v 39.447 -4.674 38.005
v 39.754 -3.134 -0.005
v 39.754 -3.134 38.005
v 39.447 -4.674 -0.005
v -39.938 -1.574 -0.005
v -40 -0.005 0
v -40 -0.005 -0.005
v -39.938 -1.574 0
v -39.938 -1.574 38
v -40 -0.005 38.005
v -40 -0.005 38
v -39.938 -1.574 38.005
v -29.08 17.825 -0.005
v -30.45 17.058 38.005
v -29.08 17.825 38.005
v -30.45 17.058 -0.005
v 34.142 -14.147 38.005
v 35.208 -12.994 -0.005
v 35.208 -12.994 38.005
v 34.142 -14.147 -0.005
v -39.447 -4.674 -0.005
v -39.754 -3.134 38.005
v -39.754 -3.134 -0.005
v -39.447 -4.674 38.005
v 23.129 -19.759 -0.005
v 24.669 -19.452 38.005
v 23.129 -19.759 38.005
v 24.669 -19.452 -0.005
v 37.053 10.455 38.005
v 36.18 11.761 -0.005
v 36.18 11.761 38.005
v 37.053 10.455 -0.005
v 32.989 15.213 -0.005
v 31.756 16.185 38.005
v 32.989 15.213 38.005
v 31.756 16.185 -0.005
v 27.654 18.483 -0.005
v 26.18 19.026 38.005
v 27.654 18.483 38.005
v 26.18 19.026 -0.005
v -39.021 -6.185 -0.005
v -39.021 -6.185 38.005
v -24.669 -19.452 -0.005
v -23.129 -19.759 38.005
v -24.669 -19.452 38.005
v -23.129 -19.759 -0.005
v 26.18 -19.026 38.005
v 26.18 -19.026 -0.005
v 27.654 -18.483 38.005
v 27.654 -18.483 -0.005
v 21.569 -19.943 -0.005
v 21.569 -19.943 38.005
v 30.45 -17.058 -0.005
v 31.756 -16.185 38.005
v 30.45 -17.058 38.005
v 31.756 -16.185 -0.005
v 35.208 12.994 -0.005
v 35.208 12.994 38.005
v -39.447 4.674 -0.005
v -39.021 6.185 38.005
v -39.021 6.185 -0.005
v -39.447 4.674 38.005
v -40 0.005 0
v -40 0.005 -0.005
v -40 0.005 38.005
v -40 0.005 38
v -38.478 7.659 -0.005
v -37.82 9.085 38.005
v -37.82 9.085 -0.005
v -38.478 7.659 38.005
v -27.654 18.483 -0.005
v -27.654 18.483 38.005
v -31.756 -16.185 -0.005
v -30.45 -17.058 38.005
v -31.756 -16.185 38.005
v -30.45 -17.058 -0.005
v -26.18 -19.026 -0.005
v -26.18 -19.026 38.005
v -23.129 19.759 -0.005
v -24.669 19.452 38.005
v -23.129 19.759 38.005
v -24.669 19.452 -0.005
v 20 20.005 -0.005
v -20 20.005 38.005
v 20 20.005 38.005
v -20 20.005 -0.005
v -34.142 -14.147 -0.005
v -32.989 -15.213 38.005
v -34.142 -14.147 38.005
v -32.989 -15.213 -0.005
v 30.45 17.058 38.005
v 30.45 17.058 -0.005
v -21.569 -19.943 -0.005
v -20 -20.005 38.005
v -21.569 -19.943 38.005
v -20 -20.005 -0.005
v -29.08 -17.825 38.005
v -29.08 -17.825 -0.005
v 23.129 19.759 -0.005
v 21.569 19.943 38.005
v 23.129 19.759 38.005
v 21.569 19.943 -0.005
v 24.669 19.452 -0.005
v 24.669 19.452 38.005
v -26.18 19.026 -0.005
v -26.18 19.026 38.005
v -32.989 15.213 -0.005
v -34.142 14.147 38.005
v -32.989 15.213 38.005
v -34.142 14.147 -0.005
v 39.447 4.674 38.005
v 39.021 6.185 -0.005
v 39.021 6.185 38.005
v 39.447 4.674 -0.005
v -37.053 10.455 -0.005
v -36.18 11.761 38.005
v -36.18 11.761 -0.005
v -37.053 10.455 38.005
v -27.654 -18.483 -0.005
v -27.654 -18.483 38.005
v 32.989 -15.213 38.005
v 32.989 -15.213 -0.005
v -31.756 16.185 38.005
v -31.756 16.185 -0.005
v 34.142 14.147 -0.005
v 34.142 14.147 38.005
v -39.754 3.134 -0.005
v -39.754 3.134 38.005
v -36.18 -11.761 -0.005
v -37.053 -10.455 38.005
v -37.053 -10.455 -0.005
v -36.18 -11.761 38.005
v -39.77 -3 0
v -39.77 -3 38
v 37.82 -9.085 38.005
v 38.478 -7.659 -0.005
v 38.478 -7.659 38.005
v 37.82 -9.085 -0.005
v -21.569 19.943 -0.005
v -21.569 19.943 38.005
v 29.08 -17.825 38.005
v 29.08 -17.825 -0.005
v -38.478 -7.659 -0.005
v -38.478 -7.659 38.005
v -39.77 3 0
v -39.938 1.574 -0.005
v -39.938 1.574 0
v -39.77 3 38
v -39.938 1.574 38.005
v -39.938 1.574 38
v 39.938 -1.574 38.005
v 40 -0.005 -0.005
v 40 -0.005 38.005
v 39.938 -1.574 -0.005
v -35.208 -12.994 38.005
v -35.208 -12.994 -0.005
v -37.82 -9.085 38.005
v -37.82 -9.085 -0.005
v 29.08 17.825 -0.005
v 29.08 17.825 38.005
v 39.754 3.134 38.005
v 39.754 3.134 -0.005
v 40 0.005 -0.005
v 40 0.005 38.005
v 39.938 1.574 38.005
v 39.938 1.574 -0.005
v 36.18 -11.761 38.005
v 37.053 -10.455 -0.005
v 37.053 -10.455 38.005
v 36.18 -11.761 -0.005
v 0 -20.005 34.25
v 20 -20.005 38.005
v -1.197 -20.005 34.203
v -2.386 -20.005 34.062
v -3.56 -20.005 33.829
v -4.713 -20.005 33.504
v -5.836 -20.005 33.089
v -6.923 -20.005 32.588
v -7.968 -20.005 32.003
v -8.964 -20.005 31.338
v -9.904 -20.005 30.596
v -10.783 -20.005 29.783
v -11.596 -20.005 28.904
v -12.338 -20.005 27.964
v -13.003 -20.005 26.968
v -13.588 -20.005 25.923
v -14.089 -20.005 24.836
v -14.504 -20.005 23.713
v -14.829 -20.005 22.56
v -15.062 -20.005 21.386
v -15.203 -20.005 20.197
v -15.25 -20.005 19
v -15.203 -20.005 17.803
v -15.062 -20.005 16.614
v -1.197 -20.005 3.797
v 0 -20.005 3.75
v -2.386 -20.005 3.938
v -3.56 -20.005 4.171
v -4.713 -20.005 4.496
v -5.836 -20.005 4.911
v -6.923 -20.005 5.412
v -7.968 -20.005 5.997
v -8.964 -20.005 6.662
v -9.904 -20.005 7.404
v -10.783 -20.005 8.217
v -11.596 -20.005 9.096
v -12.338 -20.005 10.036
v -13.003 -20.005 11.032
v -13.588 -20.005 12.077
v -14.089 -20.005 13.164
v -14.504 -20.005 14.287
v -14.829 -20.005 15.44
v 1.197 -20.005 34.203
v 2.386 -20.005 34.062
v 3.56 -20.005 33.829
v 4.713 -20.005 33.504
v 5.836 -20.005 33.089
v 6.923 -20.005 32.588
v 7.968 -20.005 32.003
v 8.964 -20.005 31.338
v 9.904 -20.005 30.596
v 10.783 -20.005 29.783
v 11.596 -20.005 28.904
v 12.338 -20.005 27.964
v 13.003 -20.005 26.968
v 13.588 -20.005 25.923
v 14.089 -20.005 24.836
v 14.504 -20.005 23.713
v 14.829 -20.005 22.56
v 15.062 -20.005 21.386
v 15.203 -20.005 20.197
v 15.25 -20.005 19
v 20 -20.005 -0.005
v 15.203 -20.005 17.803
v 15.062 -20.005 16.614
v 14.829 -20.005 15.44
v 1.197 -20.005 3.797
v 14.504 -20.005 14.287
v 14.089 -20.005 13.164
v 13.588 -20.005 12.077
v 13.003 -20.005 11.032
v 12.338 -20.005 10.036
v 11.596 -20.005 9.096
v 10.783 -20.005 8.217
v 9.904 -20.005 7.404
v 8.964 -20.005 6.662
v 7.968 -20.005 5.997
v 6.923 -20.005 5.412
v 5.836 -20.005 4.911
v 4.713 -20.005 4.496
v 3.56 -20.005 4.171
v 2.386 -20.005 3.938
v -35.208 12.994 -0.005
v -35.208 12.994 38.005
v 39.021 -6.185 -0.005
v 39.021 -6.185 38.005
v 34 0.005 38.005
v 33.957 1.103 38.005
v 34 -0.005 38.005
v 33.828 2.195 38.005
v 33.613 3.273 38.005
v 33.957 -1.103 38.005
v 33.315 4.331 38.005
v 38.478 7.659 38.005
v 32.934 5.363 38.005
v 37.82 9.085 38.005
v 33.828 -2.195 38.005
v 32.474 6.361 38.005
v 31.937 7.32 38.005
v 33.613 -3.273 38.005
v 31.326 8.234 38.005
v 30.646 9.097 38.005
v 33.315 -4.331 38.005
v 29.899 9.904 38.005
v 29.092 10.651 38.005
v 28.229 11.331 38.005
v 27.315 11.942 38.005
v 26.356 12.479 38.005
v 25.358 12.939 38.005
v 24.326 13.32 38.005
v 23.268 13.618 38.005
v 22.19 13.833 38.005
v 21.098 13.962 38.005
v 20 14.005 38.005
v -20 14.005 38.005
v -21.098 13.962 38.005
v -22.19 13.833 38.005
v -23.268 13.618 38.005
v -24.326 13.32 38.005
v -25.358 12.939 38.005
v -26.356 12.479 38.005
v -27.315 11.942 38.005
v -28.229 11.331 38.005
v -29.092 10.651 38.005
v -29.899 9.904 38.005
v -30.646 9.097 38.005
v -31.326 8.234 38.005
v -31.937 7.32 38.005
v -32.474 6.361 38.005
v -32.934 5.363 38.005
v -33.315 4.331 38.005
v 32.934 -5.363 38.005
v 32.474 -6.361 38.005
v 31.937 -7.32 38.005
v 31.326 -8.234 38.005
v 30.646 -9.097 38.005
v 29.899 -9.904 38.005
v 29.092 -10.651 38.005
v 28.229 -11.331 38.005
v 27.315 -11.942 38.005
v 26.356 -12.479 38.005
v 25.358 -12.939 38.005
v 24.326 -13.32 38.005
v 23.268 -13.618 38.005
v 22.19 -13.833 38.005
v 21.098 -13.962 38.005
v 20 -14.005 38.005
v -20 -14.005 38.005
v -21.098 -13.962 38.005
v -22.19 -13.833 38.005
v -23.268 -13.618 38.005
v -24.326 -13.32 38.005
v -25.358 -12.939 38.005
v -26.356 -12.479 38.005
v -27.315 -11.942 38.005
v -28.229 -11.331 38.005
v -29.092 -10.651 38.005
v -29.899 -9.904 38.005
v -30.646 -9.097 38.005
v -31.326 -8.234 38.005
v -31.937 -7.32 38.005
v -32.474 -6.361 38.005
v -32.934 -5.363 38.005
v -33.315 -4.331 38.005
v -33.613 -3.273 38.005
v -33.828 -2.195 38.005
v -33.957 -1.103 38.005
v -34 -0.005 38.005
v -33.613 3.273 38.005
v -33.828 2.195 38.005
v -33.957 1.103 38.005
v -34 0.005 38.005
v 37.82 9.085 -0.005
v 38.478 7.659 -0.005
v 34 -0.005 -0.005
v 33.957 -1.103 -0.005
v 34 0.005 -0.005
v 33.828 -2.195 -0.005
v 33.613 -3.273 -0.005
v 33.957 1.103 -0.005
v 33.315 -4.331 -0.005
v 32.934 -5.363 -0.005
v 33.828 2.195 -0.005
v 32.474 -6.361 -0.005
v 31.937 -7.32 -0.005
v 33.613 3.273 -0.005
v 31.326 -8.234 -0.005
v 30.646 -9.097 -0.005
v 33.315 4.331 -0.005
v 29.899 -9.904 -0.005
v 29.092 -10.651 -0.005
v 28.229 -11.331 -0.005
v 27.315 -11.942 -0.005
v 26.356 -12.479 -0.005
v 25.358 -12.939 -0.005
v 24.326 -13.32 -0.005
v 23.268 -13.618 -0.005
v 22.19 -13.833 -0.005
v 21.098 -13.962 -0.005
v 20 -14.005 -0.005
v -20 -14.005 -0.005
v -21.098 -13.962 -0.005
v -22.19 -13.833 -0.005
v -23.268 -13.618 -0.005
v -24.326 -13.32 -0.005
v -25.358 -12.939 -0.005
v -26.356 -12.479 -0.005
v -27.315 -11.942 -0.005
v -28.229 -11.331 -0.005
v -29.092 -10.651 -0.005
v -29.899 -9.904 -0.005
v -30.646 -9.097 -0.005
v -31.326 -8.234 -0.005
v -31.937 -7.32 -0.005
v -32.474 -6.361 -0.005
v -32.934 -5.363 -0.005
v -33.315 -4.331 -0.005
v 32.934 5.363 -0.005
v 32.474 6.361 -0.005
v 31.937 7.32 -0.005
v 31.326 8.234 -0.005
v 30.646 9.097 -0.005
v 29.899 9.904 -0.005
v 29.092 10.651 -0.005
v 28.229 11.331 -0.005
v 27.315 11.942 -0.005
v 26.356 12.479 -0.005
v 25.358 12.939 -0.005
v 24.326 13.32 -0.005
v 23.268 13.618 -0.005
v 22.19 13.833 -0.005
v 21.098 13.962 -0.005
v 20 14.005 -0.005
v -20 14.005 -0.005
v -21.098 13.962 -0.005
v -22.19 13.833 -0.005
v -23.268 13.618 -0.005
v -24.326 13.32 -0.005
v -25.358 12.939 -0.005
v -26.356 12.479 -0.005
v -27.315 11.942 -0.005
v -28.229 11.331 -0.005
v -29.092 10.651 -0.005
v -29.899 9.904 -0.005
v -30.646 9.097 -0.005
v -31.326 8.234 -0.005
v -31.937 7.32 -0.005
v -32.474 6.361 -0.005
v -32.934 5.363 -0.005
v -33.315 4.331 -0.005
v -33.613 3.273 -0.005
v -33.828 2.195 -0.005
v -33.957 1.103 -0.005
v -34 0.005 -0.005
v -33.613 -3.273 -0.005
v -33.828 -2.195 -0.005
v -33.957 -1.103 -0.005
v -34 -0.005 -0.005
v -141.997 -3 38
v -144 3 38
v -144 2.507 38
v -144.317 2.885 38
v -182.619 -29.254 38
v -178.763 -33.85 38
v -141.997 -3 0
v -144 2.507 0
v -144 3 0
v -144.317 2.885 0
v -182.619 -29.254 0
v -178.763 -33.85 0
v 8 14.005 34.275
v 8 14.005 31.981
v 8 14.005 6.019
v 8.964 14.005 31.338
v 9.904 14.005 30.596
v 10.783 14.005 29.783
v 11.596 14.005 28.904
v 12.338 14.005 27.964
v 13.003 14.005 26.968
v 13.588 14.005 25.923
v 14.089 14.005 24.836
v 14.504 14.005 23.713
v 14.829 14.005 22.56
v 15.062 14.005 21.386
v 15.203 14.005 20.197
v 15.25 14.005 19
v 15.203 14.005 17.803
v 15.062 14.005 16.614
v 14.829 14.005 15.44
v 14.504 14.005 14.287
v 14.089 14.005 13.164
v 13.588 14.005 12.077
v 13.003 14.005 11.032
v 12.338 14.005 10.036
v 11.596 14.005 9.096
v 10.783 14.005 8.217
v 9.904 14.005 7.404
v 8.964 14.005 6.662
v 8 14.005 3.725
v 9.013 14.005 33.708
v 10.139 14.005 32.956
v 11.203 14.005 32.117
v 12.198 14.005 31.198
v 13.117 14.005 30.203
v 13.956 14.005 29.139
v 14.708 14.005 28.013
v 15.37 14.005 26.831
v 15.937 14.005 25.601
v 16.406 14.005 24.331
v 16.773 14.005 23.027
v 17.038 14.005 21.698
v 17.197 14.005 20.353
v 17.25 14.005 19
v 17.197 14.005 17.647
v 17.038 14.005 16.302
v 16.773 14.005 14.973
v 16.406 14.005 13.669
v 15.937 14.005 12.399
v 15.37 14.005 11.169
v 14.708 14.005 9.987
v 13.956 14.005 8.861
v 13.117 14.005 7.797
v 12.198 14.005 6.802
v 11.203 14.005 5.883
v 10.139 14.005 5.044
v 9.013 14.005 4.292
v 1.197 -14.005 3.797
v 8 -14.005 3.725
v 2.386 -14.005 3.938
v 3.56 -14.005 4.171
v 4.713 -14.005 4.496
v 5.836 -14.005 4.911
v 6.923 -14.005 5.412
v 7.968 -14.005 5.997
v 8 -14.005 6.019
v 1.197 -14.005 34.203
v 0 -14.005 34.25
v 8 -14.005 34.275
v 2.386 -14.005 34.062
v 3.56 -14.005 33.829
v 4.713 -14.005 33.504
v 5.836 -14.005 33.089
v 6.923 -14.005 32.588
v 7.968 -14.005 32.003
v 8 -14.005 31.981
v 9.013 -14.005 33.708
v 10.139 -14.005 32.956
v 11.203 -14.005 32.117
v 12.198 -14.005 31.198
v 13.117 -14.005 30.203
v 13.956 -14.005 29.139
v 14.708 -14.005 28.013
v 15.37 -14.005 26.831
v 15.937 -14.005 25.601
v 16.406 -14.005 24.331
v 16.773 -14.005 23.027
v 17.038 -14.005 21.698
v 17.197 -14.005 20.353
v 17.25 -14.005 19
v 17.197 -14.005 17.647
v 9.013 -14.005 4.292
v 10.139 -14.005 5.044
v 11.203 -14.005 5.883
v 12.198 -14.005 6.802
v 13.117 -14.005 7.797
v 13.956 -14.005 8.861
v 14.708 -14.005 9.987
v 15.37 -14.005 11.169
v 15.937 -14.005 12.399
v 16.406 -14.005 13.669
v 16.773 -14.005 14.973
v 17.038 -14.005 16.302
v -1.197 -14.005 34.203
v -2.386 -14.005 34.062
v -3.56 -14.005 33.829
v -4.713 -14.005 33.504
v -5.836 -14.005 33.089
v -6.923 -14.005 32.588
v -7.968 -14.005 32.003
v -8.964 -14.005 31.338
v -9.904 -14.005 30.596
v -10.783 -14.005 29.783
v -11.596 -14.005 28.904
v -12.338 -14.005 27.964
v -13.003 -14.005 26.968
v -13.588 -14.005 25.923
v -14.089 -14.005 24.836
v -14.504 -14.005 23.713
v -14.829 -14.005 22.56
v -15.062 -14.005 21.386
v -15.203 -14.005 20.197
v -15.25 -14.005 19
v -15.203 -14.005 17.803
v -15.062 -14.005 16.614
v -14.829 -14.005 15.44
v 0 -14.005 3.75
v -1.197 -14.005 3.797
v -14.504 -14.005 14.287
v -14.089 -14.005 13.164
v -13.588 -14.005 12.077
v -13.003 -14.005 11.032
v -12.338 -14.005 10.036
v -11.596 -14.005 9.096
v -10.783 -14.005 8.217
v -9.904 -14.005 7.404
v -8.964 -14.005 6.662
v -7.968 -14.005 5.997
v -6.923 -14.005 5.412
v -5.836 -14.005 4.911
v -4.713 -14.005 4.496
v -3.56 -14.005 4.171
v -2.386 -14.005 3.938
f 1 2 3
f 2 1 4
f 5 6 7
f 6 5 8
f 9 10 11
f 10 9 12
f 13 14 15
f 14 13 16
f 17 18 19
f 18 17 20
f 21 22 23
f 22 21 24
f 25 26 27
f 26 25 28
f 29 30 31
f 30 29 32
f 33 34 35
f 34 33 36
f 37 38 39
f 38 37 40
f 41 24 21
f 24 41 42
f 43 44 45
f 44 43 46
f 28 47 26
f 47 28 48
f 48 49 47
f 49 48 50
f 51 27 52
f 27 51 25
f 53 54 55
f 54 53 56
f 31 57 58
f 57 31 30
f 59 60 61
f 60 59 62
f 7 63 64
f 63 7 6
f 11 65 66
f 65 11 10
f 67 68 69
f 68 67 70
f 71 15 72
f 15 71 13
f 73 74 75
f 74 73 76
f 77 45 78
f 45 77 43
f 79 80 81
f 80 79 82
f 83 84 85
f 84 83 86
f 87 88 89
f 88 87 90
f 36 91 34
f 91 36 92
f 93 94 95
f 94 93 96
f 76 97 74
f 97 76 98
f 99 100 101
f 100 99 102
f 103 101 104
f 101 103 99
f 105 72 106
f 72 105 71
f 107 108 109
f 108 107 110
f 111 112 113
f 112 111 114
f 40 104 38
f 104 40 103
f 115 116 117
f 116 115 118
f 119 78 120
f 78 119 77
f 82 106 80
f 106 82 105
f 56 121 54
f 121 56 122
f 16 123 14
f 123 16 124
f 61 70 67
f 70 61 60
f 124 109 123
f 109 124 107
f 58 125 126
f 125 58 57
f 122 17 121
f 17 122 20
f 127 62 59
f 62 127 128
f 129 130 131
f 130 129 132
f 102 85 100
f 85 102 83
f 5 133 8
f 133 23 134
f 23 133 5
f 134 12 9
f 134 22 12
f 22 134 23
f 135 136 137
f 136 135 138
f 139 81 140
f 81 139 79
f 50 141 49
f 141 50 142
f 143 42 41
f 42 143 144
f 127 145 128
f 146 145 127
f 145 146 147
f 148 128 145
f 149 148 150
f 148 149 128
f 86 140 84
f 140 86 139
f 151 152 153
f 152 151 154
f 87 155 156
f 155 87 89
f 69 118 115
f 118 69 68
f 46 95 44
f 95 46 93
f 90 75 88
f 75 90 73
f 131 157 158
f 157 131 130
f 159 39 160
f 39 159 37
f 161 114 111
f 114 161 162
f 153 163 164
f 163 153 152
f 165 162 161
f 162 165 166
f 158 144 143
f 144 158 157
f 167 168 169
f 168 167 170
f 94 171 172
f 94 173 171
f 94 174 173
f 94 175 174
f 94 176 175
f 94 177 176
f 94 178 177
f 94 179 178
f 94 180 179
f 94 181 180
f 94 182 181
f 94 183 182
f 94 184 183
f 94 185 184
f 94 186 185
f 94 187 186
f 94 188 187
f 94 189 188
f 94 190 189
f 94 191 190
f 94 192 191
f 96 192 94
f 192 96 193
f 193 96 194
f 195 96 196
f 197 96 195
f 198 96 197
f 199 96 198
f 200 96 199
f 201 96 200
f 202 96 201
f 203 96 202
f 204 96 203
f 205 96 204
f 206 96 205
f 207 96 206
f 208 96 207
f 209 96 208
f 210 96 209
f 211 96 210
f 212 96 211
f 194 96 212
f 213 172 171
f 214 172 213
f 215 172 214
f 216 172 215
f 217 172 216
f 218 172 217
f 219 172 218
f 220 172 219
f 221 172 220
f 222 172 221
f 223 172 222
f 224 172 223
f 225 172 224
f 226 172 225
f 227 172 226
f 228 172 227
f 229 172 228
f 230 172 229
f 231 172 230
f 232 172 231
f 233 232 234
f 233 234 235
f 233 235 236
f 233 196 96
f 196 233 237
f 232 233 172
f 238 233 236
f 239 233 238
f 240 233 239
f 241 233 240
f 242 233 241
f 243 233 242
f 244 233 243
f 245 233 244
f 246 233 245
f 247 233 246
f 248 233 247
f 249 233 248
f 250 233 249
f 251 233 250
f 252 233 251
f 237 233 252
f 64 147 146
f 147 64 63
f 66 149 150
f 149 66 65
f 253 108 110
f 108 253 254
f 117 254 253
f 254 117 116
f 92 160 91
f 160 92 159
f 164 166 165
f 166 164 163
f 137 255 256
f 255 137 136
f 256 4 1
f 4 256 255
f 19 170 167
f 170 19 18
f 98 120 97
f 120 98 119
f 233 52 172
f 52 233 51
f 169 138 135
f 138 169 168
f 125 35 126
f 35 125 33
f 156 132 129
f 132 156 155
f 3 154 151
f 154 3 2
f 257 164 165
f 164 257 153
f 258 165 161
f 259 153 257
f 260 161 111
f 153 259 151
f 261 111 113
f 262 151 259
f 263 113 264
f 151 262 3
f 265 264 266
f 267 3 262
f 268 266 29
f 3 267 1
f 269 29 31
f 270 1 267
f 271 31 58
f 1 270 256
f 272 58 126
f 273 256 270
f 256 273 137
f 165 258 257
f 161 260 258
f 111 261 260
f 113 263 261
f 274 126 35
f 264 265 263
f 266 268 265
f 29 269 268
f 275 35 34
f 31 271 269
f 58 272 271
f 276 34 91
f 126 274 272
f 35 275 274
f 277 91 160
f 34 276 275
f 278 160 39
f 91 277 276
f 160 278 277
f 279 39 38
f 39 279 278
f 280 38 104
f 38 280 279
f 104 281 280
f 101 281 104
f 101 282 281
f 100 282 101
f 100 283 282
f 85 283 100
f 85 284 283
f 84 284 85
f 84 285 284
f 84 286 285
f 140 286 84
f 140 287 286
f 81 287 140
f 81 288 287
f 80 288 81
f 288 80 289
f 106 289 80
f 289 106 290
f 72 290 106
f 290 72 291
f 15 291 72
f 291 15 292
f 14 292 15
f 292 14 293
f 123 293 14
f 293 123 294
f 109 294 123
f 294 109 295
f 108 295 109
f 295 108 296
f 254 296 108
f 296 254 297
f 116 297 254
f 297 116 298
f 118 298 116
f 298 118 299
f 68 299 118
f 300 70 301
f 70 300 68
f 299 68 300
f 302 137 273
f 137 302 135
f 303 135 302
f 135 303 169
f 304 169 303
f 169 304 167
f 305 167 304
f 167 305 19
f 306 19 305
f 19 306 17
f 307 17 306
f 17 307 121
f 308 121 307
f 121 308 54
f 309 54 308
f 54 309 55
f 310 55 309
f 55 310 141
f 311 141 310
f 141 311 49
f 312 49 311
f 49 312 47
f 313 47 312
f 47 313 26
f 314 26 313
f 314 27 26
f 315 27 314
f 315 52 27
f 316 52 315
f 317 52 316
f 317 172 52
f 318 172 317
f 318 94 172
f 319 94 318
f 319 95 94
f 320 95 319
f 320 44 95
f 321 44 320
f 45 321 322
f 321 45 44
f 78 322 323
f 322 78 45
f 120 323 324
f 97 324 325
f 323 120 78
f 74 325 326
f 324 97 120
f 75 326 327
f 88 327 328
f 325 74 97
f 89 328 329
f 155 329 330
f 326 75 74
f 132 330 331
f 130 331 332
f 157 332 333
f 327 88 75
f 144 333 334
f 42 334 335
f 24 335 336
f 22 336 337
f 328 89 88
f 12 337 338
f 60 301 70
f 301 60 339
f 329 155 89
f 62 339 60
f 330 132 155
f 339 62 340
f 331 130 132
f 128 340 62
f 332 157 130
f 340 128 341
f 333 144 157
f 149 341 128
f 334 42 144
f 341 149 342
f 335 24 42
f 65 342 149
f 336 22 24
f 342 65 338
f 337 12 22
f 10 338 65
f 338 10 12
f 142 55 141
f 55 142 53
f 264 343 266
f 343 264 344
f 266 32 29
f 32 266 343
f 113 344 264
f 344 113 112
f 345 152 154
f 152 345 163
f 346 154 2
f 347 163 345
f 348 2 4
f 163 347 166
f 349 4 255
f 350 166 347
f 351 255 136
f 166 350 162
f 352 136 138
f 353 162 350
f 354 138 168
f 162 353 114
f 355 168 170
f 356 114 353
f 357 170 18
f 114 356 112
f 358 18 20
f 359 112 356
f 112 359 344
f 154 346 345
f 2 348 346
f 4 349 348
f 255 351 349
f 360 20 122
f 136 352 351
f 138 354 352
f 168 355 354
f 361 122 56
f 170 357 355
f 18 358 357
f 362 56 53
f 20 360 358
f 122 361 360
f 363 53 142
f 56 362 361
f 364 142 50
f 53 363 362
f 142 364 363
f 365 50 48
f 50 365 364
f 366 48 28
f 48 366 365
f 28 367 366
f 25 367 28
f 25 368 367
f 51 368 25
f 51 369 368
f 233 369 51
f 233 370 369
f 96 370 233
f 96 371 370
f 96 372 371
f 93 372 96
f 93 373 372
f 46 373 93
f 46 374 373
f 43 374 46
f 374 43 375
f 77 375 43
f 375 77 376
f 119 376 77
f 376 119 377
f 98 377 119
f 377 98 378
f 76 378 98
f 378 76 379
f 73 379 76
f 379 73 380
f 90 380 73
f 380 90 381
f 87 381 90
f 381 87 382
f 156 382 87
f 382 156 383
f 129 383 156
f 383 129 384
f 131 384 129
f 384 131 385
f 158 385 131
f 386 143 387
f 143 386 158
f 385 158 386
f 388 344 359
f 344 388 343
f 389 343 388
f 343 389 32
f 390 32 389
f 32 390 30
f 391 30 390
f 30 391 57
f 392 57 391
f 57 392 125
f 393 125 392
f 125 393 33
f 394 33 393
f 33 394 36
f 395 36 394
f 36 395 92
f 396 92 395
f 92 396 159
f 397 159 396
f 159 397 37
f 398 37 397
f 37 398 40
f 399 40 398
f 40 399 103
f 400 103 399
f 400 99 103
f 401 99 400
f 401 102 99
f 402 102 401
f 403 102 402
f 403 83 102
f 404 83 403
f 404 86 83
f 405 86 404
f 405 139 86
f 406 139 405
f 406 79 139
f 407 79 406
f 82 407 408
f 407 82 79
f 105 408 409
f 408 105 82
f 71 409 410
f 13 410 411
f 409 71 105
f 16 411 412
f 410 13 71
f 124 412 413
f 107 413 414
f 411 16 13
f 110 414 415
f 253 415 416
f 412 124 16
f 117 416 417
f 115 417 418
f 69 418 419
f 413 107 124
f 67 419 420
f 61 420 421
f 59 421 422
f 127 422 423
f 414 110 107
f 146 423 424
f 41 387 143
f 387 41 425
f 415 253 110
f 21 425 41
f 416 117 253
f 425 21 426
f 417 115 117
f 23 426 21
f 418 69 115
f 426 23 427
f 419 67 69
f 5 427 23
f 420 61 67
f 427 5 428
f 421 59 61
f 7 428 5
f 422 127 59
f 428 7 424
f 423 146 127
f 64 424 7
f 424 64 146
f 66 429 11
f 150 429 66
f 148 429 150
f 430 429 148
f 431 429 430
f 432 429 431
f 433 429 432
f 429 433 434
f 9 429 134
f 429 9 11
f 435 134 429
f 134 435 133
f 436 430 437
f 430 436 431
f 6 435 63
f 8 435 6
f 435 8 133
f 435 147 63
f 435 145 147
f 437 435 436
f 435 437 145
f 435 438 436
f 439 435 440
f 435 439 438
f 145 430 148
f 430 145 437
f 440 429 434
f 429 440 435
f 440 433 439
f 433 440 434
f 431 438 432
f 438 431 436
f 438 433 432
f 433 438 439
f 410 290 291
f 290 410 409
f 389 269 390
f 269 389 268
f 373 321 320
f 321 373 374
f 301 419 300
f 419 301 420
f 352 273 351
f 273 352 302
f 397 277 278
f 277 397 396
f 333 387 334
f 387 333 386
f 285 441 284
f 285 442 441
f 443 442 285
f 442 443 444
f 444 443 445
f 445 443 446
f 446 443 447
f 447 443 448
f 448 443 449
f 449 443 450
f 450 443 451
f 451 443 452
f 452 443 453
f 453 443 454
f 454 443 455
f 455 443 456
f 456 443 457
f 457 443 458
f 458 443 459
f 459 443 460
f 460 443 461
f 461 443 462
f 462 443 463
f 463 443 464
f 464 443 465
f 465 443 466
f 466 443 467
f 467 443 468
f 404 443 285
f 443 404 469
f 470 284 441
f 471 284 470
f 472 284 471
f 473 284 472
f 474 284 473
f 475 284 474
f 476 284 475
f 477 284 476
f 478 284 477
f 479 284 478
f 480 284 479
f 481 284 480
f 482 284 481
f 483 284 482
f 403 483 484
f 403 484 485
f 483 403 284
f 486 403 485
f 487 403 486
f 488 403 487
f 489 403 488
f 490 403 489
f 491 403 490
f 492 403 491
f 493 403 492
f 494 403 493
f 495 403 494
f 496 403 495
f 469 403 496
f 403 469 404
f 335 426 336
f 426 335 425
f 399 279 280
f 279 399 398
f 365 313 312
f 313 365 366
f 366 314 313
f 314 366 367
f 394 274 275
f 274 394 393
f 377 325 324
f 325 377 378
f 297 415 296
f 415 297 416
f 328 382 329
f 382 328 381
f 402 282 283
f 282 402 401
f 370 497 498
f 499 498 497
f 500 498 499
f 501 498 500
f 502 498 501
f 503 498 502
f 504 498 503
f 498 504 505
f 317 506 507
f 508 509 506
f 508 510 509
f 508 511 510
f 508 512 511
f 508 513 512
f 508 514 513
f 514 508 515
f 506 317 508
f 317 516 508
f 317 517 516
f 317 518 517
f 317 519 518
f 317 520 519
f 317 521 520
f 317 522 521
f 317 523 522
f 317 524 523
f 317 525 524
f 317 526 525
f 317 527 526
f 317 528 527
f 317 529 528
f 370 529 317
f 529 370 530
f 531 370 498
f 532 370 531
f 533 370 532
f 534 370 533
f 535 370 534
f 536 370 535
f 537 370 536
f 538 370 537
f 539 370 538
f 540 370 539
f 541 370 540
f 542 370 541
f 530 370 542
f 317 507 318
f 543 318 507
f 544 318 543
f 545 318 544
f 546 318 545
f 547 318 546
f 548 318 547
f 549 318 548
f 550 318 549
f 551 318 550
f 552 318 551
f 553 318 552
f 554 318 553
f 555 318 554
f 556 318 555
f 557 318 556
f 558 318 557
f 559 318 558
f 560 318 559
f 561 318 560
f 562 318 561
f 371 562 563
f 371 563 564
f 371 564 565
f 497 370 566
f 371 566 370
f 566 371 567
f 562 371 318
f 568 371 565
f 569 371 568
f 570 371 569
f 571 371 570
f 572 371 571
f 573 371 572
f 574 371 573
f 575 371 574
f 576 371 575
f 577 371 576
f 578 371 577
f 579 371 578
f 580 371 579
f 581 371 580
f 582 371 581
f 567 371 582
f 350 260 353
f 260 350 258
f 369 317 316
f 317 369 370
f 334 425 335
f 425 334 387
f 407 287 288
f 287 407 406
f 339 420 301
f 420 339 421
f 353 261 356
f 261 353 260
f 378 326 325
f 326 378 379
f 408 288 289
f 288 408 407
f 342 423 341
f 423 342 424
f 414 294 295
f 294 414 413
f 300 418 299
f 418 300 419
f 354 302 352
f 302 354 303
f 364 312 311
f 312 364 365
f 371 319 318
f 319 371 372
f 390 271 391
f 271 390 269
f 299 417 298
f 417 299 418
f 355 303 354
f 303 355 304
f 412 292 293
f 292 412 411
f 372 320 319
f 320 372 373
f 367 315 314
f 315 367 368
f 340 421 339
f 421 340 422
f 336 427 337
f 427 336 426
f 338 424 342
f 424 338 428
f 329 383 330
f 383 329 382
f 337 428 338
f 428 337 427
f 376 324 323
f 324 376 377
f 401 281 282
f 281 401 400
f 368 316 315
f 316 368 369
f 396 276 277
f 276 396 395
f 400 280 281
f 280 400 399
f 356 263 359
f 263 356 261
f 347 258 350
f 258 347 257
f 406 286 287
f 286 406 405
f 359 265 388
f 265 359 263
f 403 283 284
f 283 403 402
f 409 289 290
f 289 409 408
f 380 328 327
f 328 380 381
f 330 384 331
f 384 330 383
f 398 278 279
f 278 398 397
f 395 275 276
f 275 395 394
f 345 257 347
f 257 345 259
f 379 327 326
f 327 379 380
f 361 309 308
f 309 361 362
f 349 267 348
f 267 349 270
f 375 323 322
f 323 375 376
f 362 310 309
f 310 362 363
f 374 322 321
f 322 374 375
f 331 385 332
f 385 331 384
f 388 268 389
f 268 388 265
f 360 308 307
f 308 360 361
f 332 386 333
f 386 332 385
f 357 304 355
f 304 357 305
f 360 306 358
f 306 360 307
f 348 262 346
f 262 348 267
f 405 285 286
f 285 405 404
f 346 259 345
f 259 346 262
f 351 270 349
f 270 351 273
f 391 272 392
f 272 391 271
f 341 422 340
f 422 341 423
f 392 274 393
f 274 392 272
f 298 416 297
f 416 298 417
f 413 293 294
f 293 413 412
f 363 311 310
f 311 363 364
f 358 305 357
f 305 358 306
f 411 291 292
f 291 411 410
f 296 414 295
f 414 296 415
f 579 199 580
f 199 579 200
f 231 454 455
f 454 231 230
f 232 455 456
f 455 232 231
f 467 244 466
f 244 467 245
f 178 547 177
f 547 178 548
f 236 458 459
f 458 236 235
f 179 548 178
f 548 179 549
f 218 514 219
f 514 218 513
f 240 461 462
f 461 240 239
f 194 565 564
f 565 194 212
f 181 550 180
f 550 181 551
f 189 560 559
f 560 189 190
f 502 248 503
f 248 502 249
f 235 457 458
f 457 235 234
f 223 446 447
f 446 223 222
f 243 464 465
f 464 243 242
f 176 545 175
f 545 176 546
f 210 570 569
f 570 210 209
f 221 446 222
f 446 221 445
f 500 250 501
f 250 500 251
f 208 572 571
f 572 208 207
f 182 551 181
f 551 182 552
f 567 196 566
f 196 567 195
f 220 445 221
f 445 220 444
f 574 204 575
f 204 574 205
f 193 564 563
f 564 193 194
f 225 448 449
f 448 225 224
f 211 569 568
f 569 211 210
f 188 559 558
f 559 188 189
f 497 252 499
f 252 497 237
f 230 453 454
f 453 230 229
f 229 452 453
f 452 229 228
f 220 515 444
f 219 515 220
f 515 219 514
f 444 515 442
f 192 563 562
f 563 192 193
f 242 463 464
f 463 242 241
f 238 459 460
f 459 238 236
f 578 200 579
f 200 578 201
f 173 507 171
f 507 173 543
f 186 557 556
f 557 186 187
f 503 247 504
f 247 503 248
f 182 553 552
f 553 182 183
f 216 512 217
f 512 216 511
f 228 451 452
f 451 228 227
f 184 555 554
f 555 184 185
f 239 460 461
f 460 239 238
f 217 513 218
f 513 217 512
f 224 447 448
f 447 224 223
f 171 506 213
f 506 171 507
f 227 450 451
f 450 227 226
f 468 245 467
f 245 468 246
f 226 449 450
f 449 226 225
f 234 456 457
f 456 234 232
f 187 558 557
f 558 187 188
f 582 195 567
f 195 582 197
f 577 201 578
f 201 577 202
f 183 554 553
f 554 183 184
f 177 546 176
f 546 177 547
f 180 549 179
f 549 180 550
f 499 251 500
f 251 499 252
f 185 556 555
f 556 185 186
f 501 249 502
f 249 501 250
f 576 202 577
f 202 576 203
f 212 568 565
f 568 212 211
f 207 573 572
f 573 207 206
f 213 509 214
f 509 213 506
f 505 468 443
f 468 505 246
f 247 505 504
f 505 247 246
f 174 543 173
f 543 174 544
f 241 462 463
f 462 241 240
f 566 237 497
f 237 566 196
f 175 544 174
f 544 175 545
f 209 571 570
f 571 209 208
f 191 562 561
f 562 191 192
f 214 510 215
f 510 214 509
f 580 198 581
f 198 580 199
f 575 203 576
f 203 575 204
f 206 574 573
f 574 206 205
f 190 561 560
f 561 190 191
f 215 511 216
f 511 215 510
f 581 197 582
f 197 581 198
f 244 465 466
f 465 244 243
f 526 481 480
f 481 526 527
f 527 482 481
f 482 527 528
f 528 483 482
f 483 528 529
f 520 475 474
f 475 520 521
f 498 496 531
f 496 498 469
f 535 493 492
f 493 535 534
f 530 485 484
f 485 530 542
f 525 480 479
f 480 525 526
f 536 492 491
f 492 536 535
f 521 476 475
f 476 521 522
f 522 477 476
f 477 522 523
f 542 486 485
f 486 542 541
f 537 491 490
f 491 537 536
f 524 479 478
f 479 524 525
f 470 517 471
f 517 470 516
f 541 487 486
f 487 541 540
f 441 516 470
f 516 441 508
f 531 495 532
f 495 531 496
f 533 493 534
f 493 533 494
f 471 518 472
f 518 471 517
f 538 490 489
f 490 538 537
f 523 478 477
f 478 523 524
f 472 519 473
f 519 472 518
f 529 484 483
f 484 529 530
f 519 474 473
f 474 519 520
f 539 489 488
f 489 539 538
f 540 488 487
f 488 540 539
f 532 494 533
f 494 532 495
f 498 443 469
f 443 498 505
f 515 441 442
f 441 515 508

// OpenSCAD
bottleneck = 30.5;
largerad=20;
length = 80;
$fn=80;
height1=38;
supportheight=105;
supporthick=6;
topthick=supporthick;
footwide=50;
bottletorquebardiam=3;
bottledelta=5;
supportangle=5;
step=35;
holes=false;


module outside(){
    minkowski(){
    cube([length-2*largerad,0.01,0.01],center=true);
    cylinder(h=height1,r=largerad,center=false);
    }
    translate([-length/2+1,-supporthick/2,0])
    rotate([0,0,90])
    cube([supporthick,supportheight,height1],center=false);
//    translate([-length/2+1,0,4])
//    rotate([0,0,90])
//    cube([supporthick,supportheight-3,height1-8],center=false);
    translate([-length/2-supportheight-0.7*(footwide/2)+0.96,-0.6193*(footwide/2),height1/2])
    rotate([0,0,130])
    cube([supporthick,footwide,height1],center=true);
}
    


module inside(){
    translate([0,0,-1])
    minkowski(){
    cube([length-2*largerad,0.01,0.01],center=true);
    cylinder(h=height1+5,r=largerad-topthick,center=false);
    }
    translate([0,0,height1/2])
    rotate([90,0,0])
    cylinder(h=350,r=bottleneck/2,center=false);
    
    
if (holes==true){ 
    translate([-length/2-largerad/2,10,height1/2])
    rotate([90,0,0])
    cylinder(h=350,r=bottleneck*0.4,center=true);
    
    translate([-length/2-largerad/2-step,10,height1/2])
    rotate([90,0,0])
    cylinder(h=350,r=bottleneck*0.4,center=true);
    
    translate([-length/2-largerad/2-2*step,10,height1/2])
    rotate([90,0,0])
    cylinder(h=350,r=bottleneck*0.4,center=true);
    
    translate([-length/2-largerad/2-3*step,10,height1/2])
    rotate([90,0,0])
    cylinder(h=350,r=bottleneck*0.4,center=true);
    
    translate([-length/2-largerad/2-4*step,10,height1/2])
    rotate([90,0,0])
    cylinder(h=350,r=bottleneck*0.4,center=true);
}
    
}

difference(){
    outside();
    inside();
}
//union(){
//    translate([bottleneck/2,0,height1/2+bottledelta+bottletorquebardiam/2])
//    rotate([90,0,0])
//    cylinder(h=2*largerad-0.5, d=bottletorquebardiam, center=true);
//    translate([bottleneck/2,0,height1/2-bottledelta-bottletorquebardiam/2])
//    rotate([90,0,0])
//    cylinder(h=2*largerad-0.5, d=bottletorquebardiam, center=true);
//}

module support(){
    difference(){ 
        translate([0,0,height1/2])
        rotate([90,0,0])
        cylinder(h=2*largerad-1, d=bottleneck+4, center=true);
        translate([-bottleneck+3,-largerad,0]) 
        cube([bottleneck+5,2*largerad,height1+4], center=false);
        translate([0,bottleneck,height1/2])
        rotate([90,0,0])
        cylinder(h=350,r=bottleneck/2,center=false);
    }
}
    
    
support();
